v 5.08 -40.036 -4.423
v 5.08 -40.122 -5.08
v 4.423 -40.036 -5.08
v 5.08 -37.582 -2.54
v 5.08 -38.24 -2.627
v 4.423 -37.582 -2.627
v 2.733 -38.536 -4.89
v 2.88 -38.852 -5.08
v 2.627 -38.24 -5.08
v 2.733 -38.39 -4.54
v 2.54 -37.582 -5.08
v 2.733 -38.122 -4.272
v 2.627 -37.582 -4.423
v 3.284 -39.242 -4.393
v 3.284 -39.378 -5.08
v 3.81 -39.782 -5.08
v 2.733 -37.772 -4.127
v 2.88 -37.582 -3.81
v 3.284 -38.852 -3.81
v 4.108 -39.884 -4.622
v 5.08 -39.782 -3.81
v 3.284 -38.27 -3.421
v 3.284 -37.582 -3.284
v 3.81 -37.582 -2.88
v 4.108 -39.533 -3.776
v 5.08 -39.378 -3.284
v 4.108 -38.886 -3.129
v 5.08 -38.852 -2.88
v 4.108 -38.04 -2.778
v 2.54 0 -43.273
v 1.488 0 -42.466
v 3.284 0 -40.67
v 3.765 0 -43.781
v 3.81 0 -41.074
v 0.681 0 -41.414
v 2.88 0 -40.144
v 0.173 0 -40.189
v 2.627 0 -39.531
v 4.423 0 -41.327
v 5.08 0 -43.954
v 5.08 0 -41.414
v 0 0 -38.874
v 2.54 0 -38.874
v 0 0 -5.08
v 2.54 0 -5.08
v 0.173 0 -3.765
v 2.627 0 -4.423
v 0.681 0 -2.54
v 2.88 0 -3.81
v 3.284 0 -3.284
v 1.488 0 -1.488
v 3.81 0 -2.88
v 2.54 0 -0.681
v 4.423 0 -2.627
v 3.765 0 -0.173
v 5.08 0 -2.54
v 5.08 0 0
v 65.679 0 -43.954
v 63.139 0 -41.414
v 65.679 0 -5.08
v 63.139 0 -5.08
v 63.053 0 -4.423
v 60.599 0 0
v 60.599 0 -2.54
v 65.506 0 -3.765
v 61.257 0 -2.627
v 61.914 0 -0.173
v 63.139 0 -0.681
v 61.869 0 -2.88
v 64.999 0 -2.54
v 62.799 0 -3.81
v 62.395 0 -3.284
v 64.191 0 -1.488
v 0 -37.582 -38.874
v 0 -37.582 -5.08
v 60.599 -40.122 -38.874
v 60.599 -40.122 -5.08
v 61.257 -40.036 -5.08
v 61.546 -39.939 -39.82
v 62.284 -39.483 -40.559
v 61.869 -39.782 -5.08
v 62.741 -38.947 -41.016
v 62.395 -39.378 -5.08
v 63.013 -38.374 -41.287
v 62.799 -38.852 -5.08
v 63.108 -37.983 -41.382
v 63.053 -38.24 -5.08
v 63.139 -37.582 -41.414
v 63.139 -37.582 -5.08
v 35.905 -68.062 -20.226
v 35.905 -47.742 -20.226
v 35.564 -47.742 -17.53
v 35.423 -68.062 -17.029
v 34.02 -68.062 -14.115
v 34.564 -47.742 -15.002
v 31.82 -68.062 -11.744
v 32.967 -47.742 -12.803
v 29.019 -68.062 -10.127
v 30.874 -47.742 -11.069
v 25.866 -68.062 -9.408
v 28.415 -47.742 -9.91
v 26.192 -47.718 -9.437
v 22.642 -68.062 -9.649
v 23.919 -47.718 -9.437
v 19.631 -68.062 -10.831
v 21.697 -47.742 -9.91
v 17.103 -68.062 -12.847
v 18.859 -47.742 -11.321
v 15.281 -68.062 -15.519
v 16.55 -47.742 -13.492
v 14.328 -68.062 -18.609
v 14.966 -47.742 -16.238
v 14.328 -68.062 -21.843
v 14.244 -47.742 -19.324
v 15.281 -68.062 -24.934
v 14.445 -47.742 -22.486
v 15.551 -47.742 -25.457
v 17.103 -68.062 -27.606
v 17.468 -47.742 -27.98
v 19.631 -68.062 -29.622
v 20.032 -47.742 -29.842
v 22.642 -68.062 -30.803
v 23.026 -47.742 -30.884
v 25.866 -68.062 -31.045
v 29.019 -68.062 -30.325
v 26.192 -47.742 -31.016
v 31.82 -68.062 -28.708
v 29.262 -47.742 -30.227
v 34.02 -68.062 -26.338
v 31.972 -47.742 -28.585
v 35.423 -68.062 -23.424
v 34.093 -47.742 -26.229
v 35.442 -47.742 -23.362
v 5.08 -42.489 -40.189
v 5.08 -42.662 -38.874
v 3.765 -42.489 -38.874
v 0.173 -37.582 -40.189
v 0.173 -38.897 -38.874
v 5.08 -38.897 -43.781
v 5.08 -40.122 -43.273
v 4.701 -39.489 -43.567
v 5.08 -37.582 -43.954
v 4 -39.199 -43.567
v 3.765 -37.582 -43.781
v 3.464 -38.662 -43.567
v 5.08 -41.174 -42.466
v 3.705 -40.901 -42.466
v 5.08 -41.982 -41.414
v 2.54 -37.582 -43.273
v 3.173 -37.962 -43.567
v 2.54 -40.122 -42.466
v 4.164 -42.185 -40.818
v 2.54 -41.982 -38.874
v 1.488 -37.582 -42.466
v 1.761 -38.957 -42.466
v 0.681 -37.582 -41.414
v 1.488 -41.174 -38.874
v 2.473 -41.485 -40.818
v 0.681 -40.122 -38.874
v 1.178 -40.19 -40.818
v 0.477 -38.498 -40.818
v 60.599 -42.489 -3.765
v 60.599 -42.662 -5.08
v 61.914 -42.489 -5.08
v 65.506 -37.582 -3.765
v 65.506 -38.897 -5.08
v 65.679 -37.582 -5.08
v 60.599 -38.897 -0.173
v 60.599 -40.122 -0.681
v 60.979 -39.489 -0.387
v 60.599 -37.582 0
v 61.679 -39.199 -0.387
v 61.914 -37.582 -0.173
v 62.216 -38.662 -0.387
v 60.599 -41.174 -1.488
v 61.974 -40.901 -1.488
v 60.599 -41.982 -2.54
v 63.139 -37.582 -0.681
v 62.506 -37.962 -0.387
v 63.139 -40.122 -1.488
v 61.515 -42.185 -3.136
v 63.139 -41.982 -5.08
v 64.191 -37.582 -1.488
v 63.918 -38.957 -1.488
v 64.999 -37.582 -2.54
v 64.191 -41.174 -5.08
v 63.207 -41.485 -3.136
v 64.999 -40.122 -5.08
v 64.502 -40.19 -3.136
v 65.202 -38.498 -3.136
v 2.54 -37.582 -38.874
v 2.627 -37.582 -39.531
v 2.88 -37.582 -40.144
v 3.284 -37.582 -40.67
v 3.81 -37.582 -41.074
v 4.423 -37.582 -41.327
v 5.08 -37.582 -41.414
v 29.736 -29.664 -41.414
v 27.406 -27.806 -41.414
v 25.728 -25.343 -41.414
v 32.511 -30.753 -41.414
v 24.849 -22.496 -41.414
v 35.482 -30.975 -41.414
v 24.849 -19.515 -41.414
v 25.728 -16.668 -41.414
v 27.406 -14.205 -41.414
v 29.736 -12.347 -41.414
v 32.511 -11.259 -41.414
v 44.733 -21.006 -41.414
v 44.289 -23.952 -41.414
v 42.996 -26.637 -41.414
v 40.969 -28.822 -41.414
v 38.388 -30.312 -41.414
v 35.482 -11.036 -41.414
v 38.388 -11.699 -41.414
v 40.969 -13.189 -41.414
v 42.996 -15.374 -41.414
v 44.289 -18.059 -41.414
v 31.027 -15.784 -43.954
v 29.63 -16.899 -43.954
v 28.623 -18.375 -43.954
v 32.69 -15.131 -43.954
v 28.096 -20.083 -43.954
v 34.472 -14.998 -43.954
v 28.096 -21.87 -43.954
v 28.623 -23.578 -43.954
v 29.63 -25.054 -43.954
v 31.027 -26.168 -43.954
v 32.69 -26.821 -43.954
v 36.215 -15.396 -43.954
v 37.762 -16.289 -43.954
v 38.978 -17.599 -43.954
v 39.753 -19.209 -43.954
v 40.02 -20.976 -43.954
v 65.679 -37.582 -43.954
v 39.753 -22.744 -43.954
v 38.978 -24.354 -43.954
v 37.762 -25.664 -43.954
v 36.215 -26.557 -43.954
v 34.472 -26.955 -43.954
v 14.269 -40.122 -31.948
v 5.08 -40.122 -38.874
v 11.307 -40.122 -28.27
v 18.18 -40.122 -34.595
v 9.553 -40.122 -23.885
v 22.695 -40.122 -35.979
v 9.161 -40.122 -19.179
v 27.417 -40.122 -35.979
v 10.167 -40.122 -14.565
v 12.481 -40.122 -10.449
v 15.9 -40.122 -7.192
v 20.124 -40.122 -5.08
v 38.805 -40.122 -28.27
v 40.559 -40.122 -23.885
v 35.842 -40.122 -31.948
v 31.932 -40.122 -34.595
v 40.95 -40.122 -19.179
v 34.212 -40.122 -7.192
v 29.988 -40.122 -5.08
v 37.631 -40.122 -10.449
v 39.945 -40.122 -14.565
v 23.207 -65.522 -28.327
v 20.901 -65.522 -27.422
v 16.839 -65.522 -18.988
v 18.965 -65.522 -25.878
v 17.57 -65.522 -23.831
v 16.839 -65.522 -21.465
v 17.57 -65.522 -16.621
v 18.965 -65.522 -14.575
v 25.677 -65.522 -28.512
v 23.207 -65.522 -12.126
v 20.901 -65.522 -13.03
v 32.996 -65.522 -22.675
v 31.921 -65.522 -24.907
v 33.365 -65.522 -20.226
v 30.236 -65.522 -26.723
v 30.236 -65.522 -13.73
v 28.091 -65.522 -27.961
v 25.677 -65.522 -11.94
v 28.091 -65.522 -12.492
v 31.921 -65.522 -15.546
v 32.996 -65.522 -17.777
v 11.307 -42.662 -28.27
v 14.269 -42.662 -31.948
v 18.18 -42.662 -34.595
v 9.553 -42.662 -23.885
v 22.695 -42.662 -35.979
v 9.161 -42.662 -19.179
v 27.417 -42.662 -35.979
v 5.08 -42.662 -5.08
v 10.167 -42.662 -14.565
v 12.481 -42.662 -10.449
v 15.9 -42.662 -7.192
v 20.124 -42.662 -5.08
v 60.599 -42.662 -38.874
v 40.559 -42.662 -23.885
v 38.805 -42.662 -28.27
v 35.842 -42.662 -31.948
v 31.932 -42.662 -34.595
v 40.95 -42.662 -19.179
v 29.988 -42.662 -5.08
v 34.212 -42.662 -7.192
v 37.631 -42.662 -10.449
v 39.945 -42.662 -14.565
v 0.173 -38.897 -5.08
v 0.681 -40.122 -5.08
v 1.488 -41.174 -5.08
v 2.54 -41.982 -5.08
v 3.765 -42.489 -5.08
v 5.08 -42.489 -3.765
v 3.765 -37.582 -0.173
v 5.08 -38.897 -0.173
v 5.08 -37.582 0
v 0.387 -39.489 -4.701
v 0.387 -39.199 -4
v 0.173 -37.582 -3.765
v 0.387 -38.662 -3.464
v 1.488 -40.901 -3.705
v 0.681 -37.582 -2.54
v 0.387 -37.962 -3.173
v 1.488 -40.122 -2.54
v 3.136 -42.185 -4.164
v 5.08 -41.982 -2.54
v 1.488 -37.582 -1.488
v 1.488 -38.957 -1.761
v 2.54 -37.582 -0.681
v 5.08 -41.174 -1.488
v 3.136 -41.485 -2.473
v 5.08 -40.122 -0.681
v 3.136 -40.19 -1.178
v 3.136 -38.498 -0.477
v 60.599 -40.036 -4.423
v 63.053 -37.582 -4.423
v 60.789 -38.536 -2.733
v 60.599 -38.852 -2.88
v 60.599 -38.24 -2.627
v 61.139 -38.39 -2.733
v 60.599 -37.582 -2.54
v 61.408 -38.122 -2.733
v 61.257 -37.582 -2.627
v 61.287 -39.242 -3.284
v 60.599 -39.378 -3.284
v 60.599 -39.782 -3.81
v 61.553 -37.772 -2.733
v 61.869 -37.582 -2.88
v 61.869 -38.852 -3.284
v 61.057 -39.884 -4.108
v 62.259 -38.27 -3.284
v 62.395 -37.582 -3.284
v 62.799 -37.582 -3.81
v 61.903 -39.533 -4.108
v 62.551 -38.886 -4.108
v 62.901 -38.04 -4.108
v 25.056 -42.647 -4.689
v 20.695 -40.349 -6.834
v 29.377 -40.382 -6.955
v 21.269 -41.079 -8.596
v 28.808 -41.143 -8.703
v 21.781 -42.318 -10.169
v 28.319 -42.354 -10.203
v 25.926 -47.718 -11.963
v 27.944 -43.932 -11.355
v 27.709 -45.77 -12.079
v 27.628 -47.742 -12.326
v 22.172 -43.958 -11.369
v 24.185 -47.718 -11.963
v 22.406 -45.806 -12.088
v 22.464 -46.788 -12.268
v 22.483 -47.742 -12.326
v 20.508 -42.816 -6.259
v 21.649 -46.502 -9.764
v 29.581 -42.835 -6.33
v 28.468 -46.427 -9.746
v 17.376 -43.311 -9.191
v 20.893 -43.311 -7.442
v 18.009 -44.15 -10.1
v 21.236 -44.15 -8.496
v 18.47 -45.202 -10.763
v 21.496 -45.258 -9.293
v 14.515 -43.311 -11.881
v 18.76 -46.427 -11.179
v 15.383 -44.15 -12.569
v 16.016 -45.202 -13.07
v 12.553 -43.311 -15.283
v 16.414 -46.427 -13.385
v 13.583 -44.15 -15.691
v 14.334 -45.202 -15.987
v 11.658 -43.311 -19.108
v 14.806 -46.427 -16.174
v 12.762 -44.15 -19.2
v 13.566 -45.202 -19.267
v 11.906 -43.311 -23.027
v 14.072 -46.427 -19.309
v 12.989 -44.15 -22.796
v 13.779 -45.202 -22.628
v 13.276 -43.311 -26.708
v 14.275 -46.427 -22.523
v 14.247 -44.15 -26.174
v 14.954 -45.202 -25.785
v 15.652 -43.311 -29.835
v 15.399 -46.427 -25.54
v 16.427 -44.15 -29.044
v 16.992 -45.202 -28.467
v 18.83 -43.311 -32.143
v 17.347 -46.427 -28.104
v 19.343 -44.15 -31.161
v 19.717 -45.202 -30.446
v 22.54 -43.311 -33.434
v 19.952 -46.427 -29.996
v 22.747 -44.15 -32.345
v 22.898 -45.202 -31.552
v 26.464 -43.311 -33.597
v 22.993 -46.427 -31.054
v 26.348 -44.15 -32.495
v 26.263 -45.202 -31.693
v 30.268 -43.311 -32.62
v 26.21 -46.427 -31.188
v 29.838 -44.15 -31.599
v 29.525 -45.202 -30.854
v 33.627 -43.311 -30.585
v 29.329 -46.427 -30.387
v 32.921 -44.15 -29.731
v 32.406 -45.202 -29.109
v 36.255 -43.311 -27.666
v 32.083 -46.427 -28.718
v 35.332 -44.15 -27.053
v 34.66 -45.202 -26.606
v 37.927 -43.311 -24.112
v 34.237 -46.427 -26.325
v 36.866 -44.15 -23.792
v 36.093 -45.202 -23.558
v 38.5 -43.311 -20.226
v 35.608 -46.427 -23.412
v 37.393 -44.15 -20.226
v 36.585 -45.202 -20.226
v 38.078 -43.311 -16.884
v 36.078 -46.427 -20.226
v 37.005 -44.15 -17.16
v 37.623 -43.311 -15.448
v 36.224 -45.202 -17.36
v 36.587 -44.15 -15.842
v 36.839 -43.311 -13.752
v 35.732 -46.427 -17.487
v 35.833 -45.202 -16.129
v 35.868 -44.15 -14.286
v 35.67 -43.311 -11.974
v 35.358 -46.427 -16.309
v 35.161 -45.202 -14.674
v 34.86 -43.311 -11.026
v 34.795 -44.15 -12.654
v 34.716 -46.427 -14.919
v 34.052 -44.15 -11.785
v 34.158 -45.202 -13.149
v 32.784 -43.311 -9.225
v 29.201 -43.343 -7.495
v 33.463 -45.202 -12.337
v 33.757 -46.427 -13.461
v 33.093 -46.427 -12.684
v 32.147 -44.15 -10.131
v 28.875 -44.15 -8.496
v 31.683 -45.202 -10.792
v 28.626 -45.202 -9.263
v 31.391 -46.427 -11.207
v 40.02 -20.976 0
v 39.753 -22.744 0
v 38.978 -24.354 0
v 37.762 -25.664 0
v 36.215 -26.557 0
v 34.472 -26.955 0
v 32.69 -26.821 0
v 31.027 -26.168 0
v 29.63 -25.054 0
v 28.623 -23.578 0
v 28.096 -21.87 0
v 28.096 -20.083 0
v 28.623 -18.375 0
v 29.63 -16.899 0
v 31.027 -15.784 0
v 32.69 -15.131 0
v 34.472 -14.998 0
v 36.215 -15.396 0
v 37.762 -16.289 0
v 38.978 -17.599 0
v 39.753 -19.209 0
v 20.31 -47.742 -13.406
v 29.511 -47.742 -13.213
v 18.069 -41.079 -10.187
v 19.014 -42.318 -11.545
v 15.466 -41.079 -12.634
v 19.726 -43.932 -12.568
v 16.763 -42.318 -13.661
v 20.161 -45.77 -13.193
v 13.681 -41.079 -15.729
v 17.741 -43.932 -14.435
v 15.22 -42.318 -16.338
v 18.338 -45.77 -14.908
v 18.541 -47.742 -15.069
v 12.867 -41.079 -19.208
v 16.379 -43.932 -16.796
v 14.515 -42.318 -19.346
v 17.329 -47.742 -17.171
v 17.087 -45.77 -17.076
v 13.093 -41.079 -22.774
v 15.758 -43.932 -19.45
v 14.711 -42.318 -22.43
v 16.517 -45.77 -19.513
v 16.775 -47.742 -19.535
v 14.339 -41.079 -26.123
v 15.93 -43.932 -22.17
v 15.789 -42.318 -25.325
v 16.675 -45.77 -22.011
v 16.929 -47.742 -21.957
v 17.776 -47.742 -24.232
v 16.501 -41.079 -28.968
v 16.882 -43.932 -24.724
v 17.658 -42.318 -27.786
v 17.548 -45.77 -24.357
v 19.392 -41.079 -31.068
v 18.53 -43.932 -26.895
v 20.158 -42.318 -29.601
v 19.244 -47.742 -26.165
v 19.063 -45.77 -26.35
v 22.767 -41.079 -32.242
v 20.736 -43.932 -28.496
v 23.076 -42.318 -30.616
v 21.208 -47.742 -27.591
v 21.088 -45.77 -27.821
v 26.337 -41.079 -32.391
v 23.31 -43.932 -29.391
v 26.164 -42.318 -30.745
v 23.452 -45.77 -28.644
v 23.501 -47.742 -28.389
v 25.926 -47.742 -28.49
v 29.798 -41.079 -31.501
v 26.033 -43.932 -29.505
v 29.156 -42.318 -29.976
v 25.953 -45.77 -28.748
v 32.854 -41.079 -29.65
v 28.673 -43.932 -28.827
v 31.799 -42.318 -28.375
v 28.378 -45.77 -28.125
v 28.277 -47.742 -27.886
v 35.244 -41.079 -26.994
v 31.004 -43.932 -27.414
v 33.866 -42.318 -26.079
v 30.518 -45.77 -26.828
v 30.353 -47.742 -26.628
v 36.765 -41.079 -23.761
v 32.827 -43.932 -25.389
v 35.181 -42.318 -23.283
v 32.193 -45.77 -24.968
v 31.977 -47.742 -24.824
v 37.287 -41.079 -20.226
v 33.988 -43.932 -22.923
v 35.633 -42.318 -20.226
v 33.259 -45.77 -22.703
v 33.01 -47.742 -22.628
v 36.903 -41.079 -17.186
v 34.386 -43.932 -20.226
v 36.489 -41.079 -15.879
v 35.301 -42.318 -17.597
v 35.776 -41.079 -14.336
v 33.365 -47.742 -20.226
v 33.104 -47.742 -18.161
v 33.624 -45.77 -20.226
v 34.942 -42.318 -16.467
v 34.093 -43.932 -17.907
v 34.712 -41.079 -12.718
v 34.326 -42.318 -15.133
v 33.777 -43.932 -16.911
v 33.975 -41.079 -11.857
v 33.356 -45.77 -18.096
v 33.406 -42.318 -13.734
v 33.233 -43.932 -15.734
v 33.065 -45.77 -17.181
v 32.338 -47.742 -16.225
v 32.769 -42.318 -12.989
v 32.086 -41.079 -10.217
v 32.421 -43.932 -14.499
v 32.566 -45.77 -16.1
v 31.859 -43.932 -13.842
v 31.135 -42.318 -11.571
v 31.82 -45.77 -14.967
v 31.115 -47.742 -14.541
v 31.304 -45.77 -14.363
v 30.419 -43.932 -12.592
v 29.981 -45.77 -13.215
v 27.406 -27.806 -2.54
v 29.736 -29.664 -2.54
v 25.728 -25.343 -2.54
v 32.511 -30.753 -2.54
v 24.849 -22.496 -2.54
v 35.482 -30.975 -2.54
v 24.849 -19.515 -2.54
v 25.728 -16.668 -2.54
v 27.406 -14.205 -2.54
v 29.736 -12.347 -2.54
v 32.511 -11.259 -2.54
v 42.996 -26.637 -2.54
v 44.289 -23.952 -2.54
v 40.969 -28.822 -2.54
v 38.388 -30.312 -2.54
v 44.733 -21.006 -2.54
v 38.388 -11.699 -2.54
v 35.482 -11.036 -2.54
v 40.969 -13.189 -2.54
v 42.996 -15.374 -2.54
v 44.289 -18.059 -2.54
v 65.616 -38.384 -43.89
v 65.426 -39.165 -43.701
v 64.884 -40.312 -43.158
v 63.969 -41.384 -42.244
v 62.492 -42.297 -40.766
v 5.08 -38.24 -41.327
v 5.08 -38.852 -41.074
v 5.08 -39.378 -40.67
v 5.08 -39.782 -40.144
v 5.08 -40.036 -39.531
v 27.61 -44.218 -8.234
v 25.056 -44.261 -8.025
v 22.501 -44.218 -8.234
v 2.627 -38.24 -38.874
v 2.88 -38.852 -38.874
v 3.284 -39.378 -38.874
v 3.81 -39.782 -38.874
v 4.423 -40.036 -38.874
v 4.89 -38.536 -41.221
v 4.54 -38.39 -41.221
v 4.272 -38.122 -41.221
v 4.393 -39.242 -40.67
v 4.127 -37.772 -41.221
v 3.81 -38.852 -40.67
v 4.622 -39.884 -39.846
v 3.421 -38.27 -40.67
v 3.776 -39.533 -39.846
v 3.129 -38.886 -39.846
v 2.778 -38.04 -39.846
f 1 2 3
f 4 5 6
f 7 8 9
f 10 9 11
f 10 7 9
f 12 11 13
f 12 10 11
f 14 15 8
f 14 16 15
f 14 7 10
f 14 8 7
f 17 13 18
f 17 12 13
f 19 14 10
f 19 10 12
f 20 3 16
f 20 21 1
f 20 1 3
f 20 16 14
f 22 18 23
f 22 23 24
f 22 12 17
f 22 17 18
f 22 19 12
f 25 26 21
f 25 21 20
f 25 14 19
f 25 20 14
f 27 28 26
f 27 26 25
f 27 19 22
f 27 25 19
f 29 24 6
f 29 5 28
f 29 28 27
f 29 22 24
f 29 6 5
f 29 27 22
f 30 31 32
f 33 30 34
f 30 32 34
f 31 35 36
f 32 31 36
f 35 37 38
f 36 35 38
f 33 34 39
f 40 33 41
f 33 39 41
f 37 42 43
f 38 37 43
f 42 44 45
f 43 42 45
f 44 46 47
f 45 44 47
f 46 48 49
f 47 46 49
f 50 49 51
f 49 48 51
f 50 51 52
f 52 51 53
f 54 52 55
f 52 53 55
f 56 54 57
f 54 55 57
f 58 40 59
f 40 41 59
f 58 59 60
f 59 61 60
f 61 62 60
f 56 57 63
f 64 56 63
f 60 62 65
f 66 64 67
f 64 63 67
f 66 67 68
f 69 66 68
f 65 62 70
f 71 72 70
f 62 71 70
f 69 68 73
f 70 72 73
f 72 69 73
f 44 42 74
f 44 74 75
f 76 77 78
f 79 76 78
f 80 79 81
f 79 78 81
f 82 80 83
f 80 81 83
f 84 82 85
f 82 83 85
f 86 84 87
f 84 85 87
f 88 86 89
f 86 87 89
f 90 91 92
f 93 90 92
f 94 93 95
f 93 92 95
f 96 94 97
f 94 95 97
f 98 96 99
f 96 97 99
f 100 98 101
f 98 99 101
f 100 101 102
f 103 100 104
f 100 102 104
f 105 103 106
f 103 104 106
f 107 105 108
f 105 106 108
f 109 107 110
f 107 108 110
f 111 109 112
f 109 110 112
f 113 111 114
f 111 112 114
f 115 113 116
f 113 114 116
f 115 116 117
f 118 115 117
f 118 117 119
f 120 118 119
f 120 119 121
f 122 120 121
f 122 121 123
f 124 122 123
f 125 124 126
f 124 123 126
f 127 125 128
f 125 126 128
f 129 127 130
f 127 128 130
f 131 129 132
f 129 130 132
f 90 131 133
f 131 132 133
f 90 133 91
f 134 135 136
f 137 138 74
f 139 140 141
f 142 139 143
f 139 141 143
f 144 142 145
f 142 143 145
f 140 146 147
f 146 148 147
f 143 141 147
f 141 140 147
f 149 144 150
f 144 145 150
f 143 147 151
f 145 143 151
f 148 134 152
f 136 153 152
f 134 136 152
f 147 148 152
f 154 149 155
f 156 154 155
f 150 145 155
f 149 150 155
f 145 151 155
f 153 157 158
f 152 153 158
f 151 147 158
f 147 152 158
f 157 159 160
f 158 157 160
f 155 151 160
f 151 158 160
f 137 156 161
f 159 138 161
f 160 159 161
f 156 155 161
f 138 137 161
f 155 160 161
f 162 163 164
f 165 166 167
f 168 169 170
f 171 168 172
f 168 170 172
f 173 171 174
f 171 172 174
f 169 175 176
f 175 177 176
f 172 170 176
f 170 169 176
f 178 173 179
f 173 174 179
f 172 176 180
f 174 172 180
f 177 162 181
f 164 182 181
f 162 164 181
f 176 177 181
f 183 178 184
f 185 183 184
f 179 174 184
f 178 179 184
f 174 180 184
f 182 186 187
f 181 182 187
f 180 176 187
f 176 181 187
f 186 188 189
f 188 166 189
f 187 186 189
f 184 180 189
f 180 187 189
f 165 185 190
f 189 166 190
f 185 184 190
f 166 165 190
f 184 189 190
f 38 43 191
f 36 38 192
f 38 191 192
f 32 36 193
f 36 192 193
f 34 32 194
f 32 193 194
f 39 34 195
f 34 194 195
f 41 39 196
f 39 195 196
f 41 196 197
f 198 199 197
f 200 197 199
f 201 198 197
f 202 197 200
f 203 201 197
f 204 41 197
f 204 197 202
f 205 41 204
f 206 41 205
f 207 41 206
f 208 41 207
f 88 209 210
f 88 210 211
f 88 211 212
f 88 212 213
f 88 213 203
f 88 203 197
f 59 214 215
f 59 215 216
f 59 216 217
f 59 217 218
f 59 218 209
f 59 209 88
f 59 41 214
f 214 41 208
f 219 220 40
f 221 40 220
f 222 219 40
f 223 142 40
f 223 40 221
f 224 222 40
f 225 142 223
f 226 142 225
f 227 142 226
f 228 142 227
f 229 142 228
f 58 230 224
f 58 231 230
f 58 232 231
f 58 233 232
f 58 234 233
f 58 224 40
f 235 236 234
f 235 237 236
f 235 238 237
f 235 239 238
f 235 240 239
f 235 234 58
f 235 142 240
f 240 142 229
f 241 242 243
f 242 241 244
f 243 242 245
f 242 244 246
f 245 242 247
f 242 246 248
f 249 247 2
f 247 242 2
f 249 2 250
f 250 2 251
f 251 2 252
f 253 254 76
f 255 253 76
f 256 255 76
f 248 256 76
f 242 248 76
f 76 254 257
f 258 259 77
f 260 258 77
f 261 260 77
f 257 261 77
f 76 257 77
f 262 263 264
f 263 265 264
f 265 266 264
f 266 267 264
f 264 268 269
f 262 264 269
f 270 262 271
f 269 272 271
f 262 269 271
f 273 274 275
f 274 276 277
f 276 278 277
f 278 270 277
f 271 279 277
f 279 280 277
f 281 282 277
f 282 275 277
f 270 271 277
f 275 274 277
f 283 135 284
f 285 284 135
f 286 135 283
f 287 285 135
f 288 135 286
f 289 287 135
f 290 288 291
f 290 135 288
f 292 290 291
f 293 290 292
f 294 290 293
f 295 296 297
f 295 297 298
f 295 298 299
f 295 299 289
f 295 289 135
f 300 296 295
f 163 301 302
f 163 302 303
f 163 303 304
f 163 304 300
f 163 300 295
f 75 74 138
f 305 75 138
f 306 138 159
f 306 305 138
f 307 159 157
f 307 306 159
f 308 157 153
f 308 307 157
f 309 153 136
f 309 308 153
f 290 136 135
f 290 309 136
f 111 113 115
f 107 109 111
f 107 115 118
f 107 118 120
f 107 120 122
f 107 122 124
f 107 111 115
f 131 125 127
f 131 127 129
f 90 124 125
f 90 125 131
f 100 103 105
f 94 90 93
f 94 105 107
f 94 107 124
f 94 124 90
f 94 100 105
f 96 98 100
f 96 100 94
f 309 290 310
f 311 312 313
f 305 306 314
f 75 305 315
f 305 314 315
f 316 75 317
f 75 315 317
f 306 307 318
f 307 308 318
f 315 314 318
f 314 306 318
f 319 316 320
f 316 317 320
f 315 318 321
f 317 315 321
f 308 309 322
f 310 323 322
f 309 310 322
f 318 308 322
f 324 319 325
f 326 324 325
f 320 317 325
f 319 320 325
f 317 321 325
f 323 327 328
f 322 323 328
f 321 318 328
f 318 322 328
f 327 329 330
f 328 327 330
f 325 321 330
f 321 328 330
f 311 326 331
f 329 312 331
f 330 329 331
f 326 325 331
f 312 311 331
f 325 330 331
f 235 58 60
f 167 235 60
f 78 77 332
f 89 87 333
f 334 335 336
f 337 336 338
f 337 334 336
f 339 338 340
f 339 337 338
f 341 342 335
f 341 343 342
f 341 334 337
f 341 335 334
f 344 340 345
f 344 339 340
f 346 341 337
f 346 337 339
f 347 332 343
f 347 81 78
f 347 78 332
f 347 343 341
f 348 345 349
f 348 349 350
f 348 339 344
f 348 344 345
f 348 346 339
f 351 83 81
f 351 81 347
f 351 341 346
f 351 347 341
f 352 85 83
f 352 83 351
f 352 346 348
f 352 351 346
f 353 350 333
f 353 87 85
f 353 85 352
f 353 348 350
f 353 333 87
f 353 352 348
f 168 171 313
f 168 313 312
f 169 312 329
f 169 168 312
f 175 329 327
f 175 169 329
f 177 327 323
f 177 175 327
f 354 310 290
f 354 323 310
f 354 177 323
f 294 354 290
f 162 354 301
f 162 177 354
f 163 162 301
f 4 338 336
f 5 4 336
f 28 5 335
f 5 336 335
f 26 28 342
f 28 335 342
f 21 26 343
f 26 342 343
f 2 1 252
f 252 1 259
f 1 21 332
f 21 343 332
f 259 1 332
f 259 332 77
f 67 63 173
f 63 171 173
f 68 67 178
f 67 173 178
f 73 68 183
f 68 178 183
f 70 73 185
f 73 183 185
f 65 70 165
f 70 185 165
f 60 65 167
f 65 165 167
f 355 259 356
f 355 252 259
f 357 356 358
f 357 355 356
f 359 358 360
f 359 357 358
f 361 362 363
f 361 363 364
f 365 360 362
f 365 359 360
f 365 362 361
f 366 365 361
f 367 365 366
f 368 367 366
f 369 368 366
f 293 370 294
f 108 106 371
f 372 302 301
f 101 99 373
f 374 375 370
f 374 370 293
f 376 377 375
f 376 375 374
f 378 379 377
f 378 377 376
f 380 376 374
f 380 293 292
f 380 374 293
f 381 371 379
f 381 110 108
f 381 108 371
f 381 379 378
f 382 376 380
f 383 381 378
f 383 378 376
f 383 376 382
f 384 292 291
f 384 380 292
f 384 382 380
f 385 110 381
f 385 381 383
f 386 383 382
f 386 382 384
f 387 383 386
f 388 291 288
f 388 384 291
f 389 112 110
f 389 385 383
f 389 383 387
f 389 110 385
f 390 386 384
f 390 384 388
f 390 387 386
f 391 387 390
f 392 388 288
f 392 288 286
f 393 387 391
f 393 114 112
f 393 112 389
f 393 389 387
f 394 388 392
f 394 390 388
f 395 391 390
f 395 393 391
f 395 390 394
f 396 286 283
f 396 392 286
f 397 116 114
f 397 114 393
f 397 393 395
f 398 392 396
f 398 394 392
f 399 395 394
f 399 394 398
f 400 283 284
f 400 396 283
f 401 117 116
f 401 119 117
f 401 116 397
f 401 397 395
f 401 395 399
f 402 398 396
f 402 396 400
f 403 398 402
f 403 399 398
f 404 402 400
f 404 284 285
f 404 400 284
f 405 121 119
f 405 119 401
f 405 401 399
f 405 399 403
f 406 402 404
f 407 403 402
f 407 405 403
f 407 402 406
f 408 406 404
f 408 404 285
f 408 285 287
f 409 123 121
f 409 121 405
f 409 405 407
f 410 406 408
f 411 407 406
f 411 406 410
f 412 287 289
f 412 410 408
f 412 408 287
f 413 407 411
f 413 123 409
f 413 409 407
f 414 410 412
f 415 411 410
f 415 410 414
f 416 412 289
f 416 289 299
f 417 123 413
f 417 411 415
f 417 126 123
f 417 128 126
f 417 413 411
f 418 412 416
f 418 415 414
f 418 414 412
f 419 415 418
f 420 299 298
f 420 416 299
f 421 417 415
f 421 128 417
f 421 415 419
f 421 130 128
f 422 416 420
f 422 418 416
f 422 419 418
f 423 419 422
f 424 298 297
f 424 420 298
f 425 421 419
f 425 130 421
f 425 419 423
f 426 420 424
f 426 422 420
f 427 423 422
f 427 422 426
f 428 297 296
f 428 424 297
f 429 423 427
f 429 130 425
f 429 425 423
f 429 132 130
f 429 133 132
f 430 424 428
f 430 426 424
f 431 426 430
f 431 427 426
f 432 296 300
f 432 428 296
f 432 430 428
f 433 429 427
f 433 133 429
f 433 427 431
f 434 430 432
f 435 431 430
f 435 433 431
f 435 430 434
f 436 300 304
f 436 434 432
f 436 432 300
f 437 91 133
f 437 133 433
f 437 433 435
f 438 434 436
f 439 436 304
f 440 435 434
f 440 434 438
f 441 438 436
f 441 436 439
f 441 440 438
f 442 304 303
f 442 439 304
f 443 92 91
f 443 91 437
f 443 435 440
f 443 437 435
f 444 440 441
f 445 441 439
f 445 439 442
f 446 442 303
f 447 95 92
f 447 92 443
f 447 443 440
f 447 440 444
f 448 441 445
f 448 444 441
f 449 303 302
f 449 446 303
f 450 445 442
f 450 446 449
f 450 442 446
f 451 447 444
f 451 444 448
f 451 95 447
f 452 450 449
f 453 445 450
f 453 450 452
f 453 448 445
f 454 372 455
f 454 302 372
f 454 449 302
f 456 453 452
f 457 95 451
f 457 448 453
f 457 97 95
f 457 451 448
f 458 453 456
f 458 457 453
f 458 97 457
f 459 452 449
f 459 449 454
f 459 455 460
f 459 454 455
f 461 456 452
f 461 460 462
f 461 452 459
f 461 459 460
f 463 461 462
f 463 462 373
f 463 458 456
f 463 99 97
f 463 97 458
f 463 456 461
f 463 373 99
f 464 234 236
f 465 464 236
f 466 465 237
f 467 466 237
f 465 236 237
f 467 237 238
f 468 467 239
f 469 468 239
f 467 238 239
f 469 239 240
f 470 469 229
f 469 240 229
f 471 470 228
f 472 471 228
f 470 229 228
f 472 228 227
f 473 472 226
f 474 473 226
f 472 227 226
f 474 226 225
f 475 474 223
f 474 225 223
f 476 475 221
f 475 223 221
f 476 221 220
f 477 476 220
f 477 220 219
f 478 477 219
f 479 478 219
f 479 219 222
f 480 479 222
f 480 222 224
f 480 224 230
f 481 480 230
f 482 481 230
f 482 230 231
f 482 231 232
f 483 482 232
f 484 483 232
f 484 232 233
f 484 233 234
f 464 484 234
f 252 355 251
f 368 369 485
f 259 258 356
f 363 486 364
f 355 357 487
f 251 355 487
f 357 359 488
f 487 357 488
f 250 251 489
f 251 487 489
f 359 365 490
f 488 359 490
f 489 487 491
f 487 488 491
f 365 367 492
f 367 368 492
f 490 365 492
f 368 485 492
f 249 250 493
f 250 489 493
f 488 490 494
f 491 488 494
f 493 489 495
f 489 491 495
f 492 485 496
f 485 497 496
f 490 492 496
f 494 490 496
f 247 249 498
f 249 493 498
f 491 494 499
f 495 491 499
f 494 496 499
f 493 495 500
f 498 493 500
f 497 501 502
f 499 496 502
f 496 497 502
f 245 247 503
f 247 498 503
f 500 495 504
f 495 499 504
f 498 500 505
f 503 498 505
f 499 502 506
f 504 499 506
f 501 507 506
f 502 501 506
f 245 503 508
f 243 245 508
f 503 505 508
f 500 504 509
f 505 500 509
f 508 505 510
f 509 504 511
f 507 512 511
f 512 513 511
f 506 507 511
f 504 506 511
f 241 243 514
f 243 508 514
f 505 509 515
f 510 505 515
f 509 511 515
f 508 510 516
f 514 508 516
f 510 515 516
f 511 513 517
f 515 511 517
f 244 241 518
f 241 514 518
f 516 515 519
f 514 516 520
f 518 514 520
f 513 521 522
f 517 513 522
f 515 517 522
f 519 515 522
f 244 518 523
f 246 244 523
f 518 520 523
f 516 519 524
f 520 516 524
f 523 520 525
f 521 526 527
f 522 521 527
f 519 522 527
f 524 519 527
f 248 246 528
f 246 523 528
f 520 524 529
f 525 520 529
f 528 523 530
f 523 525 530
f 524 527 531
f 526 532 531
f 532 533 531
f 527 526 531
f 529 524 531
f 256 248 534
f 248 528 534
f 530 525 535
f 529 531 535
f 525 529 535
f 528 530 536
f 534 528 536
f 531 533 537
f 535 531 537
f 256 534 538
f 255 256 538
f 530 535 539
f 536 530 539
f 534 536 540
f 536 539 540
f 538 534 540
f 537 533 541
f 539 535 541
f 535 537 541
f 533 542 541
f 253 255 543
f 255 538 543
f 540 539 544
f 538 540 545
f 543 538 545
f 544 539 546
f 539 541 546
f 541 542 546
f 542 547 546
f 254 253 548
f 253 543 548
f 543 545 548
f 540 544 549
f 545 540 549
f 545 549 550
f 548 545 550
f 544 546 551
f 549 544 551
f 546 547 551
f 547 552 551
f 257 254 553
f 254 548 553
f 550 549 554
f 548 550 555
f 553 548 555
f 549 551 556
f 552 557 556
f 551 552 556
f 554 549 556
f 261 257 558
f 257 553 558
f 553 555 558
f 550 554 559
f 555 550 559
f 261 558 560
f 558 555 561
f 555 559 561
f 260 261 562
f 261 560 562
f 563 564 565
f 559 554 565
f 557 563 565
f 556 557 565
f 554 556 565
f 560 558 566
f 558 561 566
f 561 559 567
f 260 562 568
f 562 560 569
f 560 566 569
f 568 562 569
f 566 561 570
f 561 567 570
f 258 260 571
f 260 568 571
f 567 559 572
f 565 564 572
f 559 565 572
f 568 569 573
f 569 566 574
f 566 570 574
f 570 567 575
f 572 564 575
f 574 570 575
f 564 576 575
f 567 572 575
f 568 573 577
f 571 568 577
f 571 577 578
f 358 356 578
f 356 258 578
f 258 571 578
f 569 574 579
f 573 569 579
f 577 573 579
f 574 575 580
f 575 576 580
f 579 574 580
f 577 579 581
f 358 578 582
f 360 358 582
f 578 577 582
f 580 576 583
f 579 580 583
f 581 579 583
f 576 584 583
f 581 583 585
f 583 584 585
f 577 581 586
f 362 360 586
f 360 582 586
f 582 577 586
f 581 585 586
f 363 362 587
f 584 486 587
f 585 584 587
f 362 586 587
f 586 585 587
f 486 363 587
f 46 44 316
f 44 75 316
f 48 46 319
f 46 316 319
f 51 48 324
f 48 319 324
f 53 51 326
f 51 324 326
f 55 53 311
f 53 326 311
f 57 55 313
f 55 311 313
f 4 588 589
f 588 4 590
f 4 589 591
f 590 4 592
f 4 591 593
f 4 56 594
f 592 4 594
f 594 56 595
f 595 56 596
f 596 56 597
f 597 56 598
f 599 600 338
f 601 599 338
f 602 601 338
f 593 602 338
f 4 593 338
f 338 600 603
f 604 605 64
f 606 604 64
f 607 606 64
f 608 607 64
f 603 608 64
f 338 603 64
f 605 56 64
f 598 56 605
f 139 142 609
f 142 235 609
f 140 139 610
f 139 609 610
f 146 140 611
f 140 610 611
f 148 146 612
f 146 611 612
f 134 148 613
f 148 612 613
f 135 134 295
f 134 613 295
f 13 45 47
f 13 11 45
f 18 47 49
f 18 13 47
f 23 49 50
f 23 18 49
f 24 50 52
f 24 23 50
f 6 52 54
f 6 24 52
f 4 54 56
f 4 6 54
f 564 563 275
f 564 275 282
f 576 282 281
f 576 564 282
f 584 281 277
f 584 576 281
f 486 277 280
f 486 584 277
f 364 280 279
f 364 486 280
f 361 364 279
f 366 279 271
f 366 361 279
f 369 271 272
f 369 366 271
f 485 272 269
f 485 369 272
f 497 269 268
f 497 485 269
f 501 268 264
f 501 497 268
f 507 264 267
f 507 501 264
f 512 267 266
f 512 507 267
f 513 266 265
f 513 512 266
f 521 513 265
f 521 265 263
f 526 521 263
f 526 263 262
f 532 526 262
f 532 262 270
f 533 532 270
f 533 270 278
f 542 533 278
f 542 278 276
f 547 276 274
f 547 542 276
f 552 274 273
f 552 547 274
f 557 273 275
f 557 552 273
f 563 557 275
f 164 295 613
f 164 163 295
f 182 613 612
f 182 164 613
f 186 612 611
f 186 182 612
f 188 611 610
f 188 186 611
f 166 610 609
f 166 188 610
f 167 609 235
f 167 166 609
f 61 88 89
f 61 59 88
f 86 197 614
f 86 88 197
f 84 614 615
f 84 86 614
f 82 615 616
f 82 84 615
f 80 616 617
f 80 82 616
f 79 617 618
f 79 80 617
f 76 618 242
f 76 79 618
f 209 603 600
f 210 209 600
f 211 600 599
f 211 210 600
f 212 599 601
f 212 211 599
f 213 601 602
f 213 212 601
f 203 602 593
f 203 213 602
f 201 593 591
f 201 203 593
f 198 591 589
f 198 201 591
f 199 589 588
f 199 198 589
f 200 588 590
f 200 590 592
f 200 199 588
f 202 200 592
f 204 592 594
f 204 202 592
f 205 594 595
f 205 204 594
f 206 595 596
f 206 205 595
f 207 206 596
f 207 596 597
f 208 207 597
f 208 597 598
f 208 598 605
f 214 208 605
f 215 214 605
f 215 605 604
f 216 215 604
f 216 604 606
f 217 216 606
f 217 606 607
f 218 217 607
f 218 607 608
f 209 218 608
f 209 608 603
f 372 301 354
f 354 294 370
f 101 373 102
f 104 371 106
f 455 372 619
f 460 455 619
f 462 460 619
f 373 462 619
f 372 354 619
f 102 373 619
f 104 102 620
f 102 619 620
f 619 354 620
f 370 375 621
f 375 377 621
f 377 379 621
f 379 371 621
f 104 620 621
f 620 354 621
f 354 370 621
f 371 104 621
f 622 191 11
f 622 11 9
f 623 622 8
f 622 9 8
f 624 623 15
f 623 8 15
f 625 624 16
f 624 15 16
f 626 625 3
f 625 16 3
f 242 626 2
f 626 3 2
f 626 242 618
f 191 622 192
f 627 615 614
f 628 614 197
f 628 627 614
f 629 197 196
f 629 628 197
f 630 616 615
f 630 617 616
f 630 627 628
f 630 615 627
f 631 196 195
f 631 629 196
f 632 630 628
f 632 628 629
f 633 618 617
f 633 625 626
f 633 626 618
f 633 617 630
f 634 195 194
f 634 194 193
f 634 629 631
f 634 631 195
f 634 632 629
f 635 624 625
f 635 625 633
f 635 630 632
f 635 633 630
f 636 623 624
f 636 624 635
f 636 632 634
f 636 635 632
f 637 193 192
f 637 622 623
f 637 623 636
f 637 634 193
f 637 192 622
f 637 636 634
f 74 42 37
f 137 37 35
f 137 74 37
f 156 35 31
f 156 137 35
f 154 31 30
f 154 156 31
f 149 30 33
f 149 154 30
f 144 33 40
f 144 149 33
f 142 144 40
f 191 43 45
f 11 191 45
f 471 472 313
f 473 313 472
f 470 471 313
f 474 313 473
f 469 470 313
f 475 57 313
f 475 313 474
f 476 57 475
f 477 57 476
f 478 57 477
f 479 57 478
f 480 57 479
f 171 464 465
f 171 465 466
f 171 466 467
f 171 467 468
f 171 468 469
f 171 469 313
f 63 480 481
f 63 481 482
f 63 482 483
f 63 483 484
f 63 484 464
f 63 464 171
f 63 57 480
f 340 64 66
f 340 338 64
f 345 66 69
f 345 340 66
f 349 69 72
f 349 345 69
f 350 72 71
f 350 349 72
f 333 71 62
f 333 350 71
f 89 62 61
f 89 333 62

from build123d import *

# Parameters (mm, degrees)
F0_W      = 65.679371357
F0_H      = 43.9539253712
F1_DEPTH  = 42.66227
F2_R      = 10.8490718956
F3_DEPTH  = 25.4
F4_R      = 5.08
F5_R      = 5.08
F6_T      = -2.54
F7_R      = 9.9976961638
F8_DEPTH  = 43.9539253712
F9_R      = 5.9952390319
F10_DEPTH = 65.60373


with BuildPart() as f1:
    # F0 (on Front) → F1 (new body)
    with BuildSketch(Plane.XZ):
        with Locations((32.8396856785, -21.9769626856)):
            Rectangle(F0_W, F0_H)
    extrude(amount=F1_DEPTH)

    # F2 (on face) → F3 (join)
    with BuildSketch(Plane.XZ.offset(42.66227)):
        with Locations((25.0557176769, -20.2263258398)):
            Circle(F2_R)
    extrude(amount=F3_DEPTH)

    # F4
    f4_edges = [f1.edges().sort_by_distance(p)[0] for p in [
        (65.679371, -42.66227, -21.976963),
        (32.839686, -42.66227, 0),
        (0, -42.66227, -21.976963),
        (32.839686, -42.66227, -43.953925),
        (65.679371, -21.331135, 0),
        (0, -21.331135, 0),
        (0, -21.331135, -43.953925),
    ]]
    fillet(f4_edges, radius=F4_R)

    # F5
    f5_edges = [f1.edges().sort_by_distance(p)[0] for p in [
        (60.599371, -42.66227, -21.976963),
        (32.839686, -42.66227, -38.873925),
        (32.839686, -42.66227, -5.08),
        (5.08, -42.66227, -21.976963),
        (14.206646, -42.66227, -20.226326),
    ]]
    fillet(f5_edges, radius=F5_R)

    # F6
    f6_openings = [f1.faces().sort_by_distance(p)[0] for p in [
        (32.90086, 0, -22.017177),
    ]]
    offset(amount=F6_T, openings=f6_openings)

    # F7 (on face) → F8 (join, through all)
    with BuildSketch(Plane(origin=(0, 0, -43.9539253712), x_dir=(1, 0, 0), z_dir=(0, 0, -1))):
        with Locations((34.7353070974, 21.0055503994)):
            Circle(F7_R)
    extrude(amount=-F8_DEPTH)

    # F9 (on face) → F10 (cut)
    with BuildSketch(Plane(origin=(0, 0, -43.9539253712), x_dir=(1, 0, 0), z_dir=(0, 0, -1))):
        with Locations((34.0243950486, 20.9764167666)):
            Circle(F9_R)
    extrude(amount=-F10_DEPTH, mode=Mode.SUBTRACT)


solid = f1.part
